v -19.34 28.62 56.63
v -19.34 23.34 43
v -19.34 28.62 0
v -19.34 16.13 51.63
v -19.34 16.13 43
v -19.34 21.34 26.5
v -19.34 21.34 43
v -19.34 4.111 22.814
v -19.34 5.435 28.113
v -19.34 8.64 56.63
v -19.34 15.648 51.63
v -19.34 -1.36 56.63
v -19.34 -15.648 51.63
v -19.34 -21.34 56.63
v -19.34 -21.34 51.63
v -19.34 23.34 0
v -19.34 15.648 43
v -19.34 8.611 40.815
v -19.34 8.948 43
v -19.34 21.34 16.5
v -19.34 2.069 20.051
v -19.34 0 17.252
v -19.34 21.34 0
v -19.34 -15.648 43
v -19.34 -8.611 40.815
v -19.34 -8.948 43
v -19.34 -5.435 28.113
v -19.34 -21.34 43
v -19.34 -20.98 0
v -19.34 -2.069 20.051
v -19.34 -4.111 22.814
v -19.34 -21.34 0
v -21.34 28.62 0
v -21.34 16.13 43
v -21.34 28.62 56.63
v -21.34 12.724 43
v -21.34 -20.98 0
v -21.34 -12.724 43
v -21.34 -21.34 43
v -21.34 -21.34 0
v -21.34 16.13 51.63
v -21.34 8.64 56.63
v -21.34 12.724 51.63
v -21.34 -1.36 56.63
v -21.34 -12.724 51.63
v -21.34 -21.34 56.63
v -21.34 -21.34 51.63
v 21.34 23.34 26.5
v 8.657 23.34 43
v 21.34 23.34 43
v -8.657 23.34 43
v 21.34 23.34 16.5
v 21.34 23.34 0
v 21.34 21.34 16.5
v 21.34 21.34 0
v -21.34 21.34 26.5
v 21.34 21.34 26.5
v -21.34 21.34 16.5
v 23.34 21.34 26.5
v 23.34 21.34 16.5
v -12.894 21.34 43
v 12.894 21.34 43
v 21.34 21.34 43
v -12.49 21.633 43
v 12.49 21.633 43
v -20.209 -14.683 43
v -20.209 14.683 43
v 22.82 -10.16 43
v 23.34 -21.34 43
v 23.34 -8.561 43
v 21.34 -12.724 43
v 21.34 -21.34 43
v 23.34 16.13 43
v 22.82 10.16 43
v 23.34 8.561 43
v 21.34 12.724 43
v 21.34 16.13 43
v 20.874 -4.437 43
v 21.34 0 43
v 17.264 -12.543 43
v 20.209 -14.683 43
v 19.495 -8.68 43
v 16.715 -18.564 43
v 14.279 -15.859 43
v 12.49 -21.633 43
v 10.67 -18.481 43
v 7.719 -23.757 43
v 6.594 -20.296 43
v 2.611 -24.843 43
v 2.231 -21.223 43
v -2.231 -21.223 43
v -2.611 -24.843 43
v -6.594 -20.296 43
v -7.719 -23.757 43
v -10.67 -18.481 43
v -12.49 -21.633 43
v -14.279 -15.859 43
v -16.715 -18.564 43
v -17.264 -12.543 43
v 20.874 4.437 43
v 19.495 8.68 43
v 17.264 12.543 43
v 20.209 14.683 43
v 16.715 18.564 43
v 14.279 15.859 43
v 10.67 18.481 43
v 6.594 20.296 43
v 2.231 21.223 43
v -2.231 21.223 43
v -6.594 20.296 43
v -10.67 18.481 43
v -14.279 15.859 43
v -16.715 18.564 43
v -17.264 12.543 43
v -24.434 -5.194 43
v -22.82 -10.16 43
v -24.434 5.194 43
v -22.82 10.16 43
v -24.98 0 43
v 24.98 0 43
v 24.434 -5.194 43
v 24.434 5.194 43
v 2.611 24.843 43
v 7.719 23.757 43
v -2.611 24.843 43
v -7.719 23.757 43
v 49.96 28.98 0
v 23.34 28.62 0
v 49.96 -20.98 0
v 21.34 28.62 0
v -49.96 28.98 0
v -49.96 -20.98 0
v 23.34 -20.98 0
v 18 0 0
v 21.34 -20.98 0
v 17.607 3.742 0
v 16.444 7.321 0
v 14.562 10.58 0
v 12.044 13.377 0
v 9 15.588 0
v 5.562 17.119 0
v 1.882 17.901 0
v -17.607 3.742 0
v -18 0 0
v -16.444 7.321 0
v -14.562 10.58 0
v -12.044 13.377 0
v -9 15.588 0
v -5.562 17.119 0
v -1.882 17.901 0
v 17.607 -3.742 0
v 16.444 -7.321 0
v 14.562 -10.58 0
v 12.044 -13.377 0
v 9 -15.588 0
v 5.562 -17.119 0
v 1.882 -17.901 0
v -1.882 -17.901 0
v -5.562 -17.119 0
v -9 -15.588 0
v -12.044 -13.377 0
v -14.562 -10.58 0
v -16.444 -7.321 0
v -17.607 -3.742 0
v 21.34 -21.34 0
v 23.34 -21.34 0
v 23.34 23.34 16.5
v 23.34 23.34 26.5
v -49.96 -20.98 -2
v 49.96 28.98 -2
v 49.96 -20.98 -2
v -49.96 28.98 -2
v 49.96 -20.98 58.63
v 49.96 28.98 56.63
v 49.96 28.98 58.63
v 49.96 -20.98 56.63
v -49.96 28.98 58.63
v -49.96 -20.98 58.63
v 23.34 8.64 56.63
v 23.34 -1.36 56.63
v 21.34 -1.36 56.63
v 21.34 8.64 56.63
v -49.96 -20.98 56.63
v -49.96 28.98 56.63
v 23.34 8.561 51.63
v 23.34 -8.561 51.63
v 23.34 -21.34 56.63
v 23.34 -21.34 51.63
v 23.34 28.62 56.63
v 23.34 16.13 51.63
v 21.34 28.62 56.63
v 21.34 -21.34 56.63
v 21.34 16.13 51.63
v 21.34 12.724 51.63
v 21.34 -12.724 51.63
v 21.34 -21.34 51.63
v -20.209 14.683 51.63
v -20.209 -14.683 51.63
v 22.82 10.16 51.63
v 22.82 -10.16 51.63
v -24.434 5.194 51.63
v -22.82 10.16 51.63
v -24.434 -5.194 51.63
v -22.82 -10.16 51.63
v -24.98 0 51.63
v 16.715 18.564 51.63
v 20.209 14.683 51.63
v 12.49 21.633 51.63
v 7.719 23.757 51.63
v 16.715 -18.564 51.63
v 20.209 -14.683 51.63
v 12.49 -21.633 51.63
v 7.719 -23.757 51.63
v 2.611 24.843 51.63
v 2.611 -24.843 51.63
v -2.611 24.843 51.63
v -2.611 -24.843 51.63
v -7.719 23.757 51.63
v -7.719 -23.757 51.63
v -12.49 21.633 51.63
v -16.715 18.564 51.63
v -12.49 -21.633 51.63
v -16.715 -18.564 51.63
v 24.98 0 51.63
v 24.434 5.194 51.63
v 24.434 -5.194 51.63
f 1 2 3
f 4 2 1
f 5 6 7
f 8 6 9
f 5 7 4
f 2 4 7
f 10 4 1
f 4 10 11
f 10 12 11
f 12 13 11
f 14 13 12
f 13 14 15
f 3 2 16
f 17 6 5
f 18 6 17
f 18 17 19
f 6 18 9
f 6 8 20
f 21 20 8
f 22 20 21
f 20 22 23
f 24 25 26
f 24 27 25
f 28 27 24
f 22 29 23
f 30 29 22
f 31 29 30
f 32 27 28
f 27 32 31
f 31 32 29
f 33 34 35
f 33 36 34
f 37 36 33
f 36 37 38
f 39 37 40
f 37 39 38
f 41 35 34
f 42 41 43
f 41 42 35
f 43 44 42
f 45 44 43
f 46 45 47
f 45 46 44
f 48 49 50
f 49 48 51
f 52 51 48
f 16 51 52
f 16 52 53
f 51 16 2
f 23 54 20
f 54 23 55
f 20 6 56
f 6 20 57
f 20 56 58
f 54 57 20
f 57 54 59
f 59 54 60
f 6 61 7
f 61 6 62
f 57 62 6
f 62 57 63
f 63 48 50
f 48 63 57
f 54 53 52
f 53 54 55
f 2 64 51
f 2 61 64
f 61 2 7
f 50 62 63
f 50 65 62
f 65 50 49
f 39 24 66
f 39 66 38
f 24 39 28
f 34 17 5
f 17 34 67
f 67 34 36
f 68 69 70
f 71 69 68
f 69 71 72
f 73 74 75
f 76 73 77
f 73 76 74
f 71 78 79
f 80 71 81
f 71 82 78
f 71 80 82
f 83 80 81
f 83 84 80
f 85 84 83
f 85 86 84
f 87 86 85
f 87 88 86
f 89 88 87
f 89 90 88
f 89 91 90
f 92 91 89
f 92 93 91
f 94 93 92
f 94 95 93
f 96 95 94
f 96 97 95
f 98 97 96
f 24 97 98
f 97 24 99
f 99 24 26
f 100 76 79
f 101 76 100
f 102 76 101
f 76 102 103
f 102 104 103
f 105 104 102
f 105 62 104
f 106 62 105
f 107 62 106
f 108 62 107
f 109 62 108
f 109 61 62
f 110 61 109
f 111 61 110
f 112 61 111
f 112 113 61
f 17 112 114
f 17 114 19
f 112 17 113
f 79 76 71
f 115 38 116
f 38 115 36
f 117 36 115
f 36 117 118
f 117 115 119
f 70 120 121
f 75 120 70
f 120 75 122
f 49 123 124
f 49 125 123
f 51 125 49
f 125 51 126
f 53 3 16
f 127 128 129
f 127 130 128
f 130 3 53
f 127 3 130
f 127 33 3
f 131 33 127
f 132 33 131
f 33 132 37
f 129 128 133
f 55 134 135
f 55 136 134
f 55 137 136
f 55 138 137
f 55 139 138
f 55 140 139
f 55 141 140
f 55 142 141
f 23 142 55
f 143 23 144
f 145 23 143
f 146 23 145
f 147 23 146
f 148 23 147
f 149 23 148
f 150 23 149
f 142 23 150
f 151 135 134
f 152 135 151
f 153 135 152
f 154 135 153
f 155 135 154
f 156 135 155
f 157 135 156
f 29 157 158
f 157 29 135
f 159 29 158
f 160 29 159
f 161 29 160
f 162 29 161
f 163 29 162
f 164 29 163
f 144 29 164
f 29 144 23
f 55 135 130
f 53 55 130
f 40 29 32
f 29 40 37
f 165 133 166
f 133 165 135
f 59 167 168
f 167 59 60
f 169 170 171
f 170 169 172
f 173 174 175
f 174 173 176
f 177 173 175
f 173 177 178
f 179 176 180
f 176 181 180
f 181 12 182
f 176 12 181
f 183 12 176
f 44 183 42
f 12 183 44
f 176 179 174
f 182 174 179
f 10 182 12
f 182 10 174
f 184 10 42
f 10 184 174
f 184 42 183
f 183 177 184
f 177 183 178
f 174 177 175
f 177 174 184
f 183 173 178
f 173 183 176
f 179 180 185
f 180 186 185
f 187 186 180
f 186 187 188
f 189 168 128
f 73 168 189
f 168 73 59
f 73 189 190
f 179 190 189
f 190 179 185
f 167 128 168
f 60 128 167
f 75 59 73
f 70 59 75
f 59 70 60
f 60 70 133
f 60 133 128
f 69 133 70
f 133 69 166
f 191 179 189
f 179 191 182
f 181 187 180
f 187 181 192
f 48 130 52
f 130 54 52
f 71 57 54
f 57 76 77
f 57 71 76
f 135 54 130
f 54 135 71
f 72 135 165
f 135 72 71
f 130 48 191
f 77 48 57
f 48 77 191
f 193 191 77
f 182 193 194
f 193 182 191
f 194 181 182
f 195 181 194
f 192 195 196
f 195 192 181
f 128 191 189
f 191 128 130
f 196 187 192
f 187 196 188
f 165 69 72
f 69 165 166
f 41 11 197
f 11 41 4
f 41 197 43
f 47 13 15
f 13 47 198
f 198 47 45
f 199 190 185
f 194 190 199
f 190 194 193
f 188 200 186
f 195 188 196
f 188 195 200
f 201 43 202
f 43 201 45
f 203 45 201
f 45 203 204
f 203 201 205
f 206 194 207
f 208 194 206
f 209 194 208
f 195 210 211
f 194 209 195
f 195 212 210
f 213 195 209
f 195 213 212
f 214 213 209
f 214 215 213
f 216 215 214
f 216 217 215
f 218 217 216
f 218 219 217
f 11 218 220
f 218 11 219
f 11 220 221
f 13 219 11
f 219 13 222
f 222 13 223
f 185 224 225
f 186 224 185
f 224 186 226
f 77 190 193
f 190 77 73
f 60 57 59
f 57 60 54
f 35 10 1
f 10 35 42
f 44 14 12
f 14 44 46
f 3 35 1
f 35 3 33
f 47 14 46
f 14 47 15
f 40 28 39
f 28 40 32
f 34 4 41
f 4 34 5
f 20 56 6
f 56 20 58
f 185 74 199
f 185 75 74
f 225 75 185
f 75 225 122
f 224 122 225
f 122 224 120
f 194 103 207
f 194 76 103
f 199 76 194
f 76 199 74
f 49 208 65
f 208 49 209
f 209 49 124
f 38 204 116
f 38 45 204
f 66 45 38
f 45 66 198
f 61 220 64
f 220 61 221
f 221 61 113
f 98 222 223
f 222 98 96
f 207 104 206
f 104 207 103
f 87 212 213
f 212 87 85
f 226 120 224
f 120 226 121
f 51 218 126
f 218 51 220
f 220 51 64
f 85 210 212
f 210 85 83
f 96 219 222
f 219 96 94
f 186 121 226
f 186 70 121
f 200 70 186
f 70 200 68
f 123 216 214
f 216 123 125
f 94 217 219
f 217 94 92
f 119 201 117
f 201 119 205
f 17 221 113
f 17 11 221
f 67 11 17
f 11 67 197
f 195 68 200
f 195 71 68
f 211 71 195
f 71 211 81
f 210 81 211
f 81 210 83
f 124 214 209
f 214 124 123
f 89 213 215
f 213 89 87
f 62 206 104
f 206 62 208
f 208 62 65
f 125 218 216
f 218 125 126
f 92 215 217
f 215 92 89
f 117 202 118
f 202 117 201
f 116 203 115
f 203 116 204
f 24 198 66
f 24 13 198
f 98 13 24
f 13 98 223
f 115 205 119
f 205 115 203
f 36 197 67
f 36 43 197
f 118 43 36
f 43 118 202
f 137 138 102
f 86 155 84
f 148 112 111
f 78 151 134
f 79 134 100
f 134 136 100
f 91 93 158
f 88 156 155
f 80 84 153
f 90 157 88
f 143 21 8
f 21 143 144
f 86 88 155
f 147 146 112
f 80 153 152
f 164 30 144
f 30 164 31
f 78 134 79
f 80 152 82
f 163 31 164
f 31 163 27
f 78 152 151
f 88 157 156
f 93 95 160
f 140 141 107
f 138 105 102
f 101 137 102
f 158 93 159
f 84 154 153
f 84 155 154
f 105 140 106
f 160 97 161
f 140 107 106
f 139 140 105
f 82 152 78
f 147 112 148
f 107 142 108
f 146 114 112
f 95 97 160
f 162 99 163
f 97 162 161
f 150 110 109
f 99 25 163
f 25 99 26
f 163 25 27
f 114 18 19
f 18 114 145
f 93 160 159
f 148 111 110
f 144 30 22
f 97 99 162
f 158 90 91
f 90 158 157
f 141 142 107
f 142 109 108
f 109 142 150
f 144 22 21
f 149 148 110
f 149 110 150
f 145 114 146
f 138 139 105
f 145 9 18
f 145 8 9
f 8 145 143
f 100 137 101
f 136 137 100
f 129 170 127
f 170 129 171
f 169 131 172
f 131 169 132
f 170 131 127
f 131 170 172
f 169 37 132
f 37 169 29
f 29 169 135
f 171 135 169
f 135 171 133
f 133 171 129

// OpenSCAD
//kCup solution
//@author gabriel ruttner <gabriel.ruttner@gmail.com>

//dimension variables

/* kCup
 * ----------- diameter_flange
 *  \       /  diameter_top
 *   \     /
 *    \___/   diameter_bottom
 */

kCup_diameter_flange = 49.96;
kCup_height_flange   = 8.63;
kCup_diameter_top    = 42.68;
kCup_diameter_bot    = 36;
kCup_height          = 43;


/*
 * STDandard interferances
 */
 s1 = 1;
 
 
 /*
  * material constraints
  */
t2 = 2; //2mm thickness
mS = 5; //minSolid amount
keyL = 10;//key length
throughAll = 2;

module kCup(){
     union(){
        translate([0,0,kCup_height]){
            cylinder(kCup_height_flange, 
                    d=kCup_diameter_flange);
        }
        cylinder(kCup_height, d2 = kCup_diameter_top, 
                d1 = kCup_diameter_bot);
    }
}


module kCupSlotPane(){
    width = kCup_diameter_flange;
    height = kCup_height+kCup_height_flange+mS;
    union(){
        difference(){
            difference(){
                //slot for kCup flange
                cube([t2, width, height]);
                translate([0,0,kCup_height]){
                    //@TODO diameter is wrong
                    //actual pannel
                    cube([t2+s1,
                          width*3/4,
                          kCup_height_flange]);
                }
            }
            
            //key holes for kCupSlotBackPane()
            translate([0,kCup_diameter_top, kCup_height/2-keyL/2]){        //keyDim
            cube([throughAll, t2, keyL]);
            }
        }
        
        //bottom key
        translate([0, width/2-keyL/2, -t2]){//bottom key
            cube([t2, keyL, t2]);
        }
        //top key
        translate([0, width/2-keyL/2, height]){//bottom key
            cube([t2, keyL, t2]);
        }       
    }
}

module horizontalPanes(){
    //@TODO keyholes
    width = 2*kCup_diameter_flange;
    depth = kCup_diameter_flange;
    translate([-width/2, -depth/2+2*t2, 0]){
        cube([width, depth, t2]);
    }
}

module kCupSlotBackPane(){
    width = kCup_diameter_top-t2;
    union(){
        
        translate([0,0,kCup_height/2-keyL/2]){//left key
        cube([t2, t2, keyL]);
        }
        translate([t2,0, 0]){
        cube([width, t2, kCup_height]);
        }
        
        translate([width+t2,0, kCup_height/2-keyL/2]){//right key
        cube([t2, t2, keyL]);
        }
        
        translate([width/2 - keyL/2 + t2 ,0, -t2]){//bottom key
        cube([keyL, t2, t2]);
        }
    }
    
    }

module assembly(){
    
    color("purple", 0.5){
        translate([-kCup_diameter_top/2, kCup_diameter_top/2, 0]){
            kCupSlotBackPane();
        }
    }
    
    translate([0,0,kCup_height+kCup_height_flange+mS]){
        color("red"){
            difference(){
            horizontalPanes();
            translate([0,0,-34]){
                cylinder(d=kCup_diameter_bot/4, h=throughAll);
            }
            }
        }
    }
    
    translate([0,0,-t2]){
        color("red"){
            horizontalPanes();
        }
    }    
    //locktight
    translate([kCup_diameter_top/2, -kCup_diameter_top/2, 0]){
        kCupSlotPane();
    }

    translate([-kCup_diameter_top/2, -kCup_diameter_top/2, 0]){
        kCupSlotPane();
    }
    
    color("green"){
        kCup();
    }
    
    
}

assembly();
